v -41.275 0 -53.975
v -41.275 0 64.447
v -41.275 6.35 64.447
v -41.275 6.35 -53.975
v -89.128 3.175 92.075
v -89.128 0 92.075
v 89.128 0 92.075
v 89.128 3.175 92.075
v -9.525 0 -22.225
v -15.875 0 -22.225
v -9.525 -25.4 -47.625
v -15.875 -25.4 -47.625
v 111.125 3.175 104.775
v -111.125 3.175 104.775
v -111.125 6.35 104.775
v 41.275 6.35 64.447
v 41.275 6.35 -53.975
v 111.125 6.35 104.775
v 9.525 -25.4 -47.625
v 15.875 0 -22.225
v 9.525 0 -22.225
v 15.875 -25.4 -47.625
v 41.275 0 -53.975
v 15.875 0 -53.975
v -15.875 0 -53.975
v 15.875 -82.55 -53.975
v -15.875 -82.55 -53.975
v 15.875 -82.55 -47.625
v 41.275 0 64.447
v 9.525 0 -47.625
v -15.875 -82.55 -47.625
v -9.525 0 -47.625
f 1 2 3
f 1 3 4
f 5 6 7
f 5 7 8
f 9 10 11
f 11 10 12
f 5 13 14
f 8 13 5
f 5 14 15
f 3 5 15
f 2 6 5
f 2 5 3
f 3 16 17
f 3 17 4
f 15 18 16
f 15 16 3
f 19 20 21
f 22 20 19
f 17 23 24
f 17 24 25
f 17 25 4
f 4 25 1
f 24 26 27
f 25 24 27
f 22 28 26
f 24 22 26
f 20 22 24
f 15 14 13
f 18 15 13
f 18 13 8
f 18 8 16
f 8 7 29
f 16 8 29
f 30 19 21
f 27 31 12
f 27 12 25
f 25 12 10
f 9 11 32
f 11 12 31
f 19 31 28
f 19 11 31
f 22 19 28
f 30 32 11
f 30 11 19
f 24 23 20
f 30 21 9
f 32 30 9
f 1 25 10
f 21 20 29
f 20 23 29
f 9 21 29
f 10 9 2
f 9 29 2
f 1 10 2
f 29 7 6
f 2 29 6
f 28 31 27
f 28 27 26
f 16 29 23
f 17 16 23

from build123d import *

# Parameters (mm, degrees)
F1_DEPTH  = 6.35
F3_W      = 31.75
F3_H      = 6.35
F4_DEPTH  = 82.55
F6_DEPTH  = 6.35
F9_W      = 3.175
F9_H      = 12.7
F10_DEPTH = 222.25


with BuildPart() as f1:
    # F0 (on Front) → F1 (new body)
    with BuildSketch(Plane.XZ):
        Polygon((-41.275, 64.447084), (-41.275, 104.775), (-111.125, 104.775), align=None)
        Polygon((0, 104.775), (-41.275, 104.775), (-41.275, 64.447084), (-41.275, -53.975), (0, -53.975), align=None)
    extrude(amount=-F1_DEPTH)

    # F2: F1 across plane


with BuildPart() as f1_1:
    add(f1.part)
    add(f1.part.mirror(Plane.YZ))

    # F3 (on Front) → F4 (join)
    with BuildSketch(Plane.XZ):
        with Locations((0, -50.8)):
            Rectangle(F3_W, F3_H)
    extrude(amount=F4_DEPTH)

    # F5 (on face) → F6 (join)
    with BuildSketch(Plane.YZ.offset(15.875)):
        Polygon((0, -22.225), (-25.4, -47.625), (0, -47.625), align=None)
    extrude(amount=-F6_DEPTH)

    # F7: F1 across plane


with BuildPart() as f1_2:
    add(f1_1.part)
    add(f1_1.part.mirror(Plane.YZ))

    # F9 (on offset) → F10 (cut)
    with BuildSketch(Plane.YZ.offset(111.125)):
        with Locations((1.5875, 98.425)):
            Rectangle(F9_W, F9_H)
    extrude(amount=-F10_DEPTH, mode=Mode.SUBTRACT)


solid = f1_2.part
